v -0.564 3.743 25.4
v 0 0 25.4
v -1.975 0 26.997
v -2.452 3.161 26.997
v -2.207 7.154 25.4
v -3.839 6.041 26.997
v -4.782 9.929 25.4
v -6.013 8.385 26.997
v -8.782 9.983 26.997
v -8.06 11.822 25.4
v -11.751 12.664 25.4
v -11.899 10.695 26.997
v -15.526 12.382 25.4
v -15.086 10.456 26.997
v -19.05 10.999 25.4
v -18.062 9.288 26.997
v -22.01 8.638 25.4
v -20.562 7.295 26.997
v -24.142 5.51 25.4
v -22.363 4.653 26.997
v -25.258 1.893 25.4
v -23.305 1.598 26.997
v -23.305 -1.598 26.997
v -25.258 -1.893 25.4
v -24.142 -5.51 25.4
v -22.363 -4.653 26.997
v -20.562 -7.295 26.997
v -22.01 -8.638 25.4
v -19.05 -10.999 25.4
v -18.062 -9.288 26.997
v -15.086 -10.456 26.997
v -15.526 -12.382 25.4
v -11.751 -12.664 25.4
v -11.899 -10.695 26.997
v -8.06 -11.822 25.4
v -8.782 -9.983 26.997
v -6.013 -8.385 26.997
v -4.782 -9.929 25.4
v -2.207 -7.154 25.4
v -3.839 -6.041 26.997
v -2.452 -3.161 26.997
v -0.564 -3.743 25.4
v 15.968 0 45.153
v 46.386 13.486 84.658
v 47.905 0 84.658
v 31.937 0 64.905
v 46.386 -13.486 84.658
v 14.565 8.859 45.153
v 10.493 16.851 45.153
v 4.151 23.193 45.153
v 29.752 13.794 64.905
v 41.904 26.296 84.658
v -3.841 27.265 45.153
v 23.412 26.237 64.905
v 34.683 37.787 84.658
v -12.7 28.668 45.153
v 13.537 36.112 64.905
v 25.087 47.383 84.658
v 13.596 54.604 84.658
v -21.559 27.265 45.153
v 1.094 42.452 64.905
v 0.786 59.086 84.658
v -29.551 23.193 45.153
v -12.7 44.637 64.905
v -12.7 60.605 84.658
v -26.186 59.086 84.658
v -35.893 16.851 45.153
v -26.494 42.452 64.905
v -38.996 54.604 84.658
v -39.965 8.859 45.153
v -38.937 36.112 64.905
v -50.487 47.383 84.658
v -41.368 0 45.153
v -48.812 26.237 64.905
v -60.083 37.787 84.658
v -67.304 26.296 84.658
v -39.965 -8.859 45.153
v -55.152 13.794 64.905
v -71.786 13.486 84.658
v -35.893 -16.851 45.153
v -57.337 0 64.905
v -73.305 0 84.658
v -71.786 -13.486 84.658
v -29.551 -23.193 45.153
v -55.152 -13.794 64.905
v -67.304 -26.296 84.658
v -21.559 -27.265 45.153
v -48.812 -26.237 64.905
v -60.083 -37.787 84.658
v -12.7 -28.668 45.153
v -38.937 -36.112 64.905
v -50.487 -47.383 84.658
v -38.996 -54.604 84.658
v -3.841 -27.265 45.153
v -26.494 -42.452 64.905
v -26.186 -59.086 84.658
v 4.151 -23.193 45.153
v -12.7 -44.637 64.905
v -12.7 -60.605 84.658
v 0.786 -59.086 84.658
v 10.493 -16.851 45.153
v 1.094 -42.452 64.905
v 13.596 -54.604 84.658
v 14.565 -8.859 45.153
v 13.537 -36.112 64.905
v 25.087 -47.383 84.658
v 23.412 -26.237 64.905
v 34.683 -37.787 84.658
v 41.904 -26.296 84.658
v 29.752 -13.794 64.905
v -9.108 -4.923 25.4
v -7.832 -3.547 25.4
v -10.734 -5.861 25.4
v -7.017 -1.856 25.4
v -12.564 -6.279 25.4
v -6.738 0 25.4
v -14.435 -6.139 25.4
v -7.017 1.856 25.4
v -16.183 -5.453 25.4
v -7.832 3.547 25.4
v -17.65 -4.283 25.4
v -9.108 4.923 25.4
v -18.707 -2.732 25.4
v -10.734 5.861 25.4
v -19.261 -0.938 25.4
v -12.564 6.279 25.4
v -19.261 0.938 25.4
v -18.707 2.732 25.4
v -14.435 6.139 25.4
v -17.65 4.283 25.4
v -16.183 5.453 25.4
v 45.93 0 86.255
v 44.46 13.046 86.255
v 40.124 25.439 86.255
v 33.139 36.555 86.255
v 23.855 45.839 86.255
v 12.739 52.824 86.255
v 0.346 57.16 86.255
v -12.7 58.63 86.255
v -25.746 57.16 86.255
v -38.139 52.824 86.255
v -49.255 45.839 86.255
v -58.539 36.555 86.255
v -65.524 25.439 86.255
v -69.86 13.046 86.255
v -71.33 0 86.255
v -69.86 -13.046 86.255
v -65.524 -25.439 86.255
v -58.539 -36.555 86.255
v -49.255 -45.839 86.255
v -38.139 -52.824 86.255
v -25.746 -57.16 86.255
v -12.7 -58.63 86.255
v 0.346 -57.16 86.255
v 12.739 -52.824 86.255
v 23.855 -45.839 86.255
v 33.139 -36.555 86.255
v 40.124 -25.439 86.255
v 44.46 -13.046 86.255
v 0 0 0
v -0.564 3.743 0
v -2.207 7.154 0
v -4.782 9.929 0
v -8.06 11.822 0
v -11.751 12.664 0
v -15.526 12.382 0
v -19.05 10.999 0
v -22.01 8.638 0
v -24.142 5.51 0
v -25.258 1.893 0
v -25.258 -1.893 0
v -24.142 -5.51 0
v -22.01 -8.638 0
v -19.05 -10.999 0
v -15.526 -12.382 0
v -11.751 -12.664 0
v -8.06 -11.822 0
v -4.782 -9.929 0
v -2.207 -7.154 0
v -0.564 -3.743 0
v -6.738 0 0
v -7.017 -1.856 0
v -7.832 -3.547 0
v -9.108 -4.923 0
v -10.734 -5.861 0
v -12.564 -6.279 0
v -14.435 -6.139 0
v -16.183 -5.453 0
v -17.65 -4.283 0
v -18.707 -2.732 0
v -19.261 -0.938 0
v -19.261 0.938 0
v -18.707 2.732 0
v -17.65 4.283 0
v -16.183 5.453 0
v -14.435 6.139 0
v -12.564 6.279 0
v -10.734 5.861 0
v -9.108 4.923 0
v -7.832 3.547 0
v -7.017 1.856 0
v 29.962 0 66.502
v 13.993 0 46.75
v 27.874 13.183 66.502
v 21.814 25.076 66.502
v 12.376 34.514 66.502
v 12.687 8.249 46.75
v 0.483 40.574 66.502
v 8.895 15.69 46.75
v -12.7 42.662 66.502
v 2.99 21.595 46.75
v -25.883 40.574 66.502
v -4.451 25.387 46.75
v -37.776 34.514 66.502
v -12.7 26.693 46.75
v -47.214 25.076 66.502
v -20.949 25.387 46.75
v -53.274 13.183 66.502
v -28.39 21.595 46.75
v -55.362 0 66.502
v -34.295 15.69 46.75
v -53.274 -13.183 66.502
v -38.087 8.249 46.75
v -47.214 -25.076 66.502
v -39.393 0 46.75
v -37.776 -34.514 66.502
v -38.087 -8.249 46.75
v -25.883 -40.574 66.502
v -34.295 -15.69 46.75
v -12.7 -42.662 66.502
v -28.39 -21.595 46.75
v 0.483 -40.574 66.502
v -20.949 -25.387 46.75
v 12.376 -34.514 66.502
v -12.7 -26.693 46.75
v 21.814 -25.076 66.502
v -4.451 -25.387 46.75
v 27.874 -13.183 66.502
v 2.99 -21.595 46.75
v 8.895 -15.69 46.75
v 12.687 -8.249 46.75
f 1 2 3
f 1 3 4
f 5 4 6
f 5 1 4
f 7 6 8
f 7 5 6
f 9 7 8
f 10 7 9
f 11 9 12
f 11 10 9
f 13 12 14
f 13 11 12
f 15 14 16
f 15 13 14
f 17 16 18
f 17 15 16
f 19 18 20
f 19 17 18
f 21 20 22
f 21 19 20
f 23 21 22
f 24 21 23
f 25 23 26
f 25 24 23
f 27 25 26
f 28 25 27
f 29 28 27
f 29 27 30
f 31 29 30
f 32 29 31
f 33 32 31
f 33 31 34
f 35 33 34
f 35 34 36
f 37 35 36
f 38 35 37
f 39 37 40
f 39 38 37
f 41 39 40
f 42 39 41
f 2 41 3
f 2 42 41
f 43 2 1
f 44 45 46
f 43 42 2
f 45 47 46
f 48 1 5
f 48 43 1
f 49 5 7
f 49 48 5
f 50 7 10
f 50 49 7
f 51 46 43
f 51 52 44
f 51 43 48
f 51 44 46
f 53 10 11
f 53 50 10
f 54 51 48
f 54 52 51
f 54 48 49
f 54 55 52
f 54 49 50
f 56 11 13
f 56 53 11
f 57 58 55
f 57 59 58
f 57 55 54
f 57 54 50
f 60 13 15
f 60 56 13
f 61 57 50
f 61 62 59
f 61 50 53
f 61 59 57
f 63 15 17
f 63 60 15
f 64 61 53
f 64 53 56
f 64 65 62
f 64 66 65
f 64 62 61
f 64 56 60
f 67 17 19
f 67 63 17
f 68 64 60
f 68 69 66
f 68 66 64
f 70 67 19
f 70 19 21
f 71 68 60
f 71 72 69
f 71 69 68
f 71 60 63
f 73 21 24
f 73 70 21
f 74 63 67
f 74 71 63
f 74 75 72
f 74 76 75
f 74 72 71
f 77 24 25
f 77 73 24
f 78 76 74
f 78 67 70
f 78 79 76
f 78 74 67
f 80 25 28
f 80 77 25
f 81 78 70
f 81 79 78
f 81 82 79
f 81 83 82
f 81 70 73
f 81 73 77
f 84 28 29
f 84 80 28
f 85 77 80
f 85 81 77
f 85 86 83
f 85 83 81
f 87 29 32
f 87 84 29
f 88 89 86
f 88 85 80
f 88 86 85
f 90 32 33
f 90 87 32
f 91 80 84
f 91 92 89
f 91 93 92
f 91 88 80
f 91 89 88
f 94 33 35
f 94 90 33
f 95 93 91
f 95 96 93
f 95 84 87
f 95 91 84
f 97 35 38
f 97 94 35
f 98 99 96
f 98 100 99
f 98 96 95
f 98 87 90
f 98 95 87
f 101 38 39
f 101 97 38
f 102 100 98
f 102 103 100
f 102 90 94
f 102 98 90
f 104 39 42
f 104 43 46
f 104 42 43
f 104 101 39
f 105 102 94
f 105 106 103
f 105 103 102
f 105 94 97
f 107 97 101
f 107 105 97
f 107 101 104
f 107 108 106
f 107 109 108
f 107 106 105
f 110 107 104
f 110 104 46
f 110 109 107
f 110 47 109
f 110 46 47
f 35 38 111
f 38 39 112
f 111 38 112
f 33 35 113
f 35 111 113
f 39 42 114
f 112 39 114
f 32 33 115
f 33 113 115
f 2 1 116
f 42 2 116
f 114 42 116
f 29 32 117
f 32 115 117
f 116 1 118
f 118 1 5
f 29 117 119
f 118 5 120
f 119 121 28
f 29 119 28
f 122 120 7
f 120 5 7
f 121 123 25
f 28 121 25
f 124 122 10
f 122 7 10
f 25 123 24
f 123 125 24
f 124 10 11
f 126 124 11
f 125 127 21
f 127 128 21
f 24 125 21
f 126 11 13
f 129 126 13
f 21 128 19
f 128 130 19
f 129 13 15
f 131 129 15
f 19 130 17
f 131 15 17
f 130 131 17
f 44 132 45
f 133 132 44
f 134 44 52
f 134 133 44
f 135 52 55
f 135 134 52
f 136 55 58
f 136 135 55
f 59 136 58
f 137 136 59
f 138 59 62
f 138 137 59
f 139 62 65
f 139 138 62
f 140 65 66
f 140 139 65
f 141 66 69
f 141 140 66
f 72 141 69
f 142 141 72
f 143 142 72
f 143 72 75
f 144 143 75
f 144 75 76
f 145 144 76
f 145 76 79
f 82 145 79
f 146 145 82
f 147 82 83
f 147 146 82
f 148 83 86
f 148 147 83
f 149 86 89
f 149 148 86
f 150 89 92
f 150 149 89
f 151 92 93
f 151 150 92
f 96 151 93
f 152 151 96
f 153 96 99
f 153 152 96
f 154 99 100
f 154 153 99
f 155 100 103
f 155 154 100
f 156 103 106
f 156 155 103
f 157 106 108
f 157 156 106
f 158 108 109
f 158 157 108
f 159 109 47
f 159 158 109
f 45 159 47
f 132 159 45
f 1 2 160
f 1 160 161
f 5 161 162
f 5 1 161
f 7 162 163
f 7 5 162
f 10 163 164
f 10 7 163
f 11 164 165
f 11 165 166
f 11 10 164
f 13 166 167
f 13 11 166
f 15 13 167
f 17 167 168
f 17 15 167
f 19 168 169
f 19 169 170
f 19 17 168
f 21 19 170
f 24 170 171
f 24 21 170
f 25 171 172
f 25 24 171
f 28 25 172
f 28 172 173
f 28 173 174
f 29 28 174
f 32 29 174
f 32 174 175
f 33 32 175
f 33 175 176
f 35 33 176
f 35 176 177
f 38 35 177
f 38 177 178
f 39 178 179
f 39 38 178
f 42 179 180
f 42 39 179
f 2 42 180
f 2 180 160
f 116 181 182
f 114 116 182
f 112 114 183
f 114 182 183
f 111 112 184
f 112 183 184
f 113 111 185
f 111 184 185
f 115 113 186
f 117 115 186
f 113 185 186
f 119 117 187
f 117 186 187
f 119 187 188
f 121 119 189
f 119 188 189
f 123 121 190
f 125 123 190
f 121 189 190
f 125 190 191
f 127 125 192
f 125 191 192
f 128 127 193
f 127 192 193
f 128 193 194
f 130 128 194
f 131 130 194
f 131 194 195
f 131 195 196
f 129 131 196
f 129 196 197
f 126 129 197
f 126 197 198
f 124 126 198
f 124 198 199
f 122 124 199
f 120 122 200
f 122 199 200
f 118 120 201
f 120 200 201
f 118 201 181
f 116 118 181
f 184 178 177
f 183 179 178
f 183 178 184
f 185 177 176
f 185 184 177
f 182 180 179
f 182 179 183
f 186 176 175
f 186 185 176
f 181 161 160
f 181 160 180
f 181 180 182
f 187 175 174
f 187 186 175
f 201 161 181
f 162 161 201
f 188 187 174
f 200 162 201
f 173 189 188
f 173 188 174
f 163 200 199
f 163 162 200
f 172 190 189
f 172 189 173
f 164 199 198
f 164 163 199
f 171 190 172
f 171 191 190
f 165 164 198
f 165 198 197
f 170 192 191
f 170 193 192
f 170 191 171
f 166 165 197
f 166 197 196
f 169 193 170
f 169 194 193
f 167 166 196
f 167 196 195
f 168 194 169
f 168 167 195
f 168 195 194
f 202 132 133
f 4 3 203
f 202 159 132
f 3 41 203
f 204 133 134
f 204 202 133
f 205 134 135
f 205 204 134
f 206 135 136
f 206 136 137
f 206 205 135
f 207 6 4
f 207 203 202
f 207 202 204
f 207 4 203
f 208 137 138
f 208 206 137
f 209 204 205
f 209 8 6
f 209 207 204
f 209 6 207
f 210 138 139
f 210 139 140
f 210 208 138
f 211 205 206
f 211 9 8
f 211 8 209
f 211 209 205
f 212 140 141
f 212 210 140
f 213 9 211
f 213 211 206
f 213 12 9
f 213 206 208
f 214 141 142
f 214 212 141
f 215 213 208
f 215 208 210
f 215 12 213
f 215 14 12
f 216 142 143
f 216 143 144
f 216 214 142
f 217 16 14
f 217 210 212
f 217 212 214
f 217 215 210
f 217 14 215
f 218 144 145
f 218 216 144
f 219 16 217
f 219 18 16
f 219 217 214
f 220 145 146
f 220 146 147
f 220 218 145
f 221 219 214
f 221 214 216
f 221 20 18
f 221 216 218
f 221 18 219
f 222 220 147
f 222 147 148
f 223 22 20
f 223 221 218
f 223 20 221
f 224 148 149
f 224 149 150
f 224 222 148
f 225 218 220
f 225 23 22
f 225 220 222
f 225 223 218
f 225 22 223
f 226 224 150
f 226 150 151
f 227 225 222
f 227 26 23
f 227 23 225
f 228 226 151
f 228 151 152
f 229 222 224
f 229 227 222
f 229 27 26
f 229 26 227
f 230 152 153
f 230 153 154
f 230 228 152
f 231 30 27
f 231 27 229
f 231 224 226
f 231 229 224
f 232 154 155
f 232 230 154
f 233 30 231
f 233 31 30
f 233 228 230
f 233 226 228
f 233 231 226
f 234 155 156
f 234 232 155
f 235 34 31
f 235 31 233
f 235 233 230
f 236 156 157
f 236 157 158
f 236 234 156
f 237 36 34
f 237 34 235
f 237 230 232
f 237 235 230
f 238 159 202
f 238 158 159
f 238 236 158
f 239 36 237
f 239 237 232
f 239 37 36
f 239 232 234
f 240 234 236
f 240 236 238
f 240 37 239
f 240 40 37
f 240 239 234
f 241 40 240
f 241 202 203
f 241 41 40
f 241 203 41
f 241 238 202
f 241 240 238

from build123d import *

# Parameters (mm, degrees)
F0_W     = 12.7
F0_H     = 25.4
F3_R     = 6.296655
F4_DEPTH = 25.4


with BuildPart() as f1:
    # F0 (on Front) → F1 (revolve)
    with BuildSketch(Plane.XZ):
        Polygon((-1.975267, 26.996847), (0, 25.4), (47.905418, 84.658003), (45.930152, 86.25485), align=None)
        with Locations((-6.35, 12.7)):
            Rectangle(F0_W, F0_H)
    revolve(axis=Axis((-12.7, 0, 12.7), (0, 0, 1)))

    # F3 (on face) → F4 (cut)
    with BuildSketch(Plane(origin=(0, 0, 0), x_dir=(1, 0, 0), z_dir=(0, 0, -1))):
        with Locations((-13.034211, 0)):
            Circle(F3_R)
    extrude(amount=-F4_DEPTH, mode=Mode.SUBTRACT)


solid = f1.part
